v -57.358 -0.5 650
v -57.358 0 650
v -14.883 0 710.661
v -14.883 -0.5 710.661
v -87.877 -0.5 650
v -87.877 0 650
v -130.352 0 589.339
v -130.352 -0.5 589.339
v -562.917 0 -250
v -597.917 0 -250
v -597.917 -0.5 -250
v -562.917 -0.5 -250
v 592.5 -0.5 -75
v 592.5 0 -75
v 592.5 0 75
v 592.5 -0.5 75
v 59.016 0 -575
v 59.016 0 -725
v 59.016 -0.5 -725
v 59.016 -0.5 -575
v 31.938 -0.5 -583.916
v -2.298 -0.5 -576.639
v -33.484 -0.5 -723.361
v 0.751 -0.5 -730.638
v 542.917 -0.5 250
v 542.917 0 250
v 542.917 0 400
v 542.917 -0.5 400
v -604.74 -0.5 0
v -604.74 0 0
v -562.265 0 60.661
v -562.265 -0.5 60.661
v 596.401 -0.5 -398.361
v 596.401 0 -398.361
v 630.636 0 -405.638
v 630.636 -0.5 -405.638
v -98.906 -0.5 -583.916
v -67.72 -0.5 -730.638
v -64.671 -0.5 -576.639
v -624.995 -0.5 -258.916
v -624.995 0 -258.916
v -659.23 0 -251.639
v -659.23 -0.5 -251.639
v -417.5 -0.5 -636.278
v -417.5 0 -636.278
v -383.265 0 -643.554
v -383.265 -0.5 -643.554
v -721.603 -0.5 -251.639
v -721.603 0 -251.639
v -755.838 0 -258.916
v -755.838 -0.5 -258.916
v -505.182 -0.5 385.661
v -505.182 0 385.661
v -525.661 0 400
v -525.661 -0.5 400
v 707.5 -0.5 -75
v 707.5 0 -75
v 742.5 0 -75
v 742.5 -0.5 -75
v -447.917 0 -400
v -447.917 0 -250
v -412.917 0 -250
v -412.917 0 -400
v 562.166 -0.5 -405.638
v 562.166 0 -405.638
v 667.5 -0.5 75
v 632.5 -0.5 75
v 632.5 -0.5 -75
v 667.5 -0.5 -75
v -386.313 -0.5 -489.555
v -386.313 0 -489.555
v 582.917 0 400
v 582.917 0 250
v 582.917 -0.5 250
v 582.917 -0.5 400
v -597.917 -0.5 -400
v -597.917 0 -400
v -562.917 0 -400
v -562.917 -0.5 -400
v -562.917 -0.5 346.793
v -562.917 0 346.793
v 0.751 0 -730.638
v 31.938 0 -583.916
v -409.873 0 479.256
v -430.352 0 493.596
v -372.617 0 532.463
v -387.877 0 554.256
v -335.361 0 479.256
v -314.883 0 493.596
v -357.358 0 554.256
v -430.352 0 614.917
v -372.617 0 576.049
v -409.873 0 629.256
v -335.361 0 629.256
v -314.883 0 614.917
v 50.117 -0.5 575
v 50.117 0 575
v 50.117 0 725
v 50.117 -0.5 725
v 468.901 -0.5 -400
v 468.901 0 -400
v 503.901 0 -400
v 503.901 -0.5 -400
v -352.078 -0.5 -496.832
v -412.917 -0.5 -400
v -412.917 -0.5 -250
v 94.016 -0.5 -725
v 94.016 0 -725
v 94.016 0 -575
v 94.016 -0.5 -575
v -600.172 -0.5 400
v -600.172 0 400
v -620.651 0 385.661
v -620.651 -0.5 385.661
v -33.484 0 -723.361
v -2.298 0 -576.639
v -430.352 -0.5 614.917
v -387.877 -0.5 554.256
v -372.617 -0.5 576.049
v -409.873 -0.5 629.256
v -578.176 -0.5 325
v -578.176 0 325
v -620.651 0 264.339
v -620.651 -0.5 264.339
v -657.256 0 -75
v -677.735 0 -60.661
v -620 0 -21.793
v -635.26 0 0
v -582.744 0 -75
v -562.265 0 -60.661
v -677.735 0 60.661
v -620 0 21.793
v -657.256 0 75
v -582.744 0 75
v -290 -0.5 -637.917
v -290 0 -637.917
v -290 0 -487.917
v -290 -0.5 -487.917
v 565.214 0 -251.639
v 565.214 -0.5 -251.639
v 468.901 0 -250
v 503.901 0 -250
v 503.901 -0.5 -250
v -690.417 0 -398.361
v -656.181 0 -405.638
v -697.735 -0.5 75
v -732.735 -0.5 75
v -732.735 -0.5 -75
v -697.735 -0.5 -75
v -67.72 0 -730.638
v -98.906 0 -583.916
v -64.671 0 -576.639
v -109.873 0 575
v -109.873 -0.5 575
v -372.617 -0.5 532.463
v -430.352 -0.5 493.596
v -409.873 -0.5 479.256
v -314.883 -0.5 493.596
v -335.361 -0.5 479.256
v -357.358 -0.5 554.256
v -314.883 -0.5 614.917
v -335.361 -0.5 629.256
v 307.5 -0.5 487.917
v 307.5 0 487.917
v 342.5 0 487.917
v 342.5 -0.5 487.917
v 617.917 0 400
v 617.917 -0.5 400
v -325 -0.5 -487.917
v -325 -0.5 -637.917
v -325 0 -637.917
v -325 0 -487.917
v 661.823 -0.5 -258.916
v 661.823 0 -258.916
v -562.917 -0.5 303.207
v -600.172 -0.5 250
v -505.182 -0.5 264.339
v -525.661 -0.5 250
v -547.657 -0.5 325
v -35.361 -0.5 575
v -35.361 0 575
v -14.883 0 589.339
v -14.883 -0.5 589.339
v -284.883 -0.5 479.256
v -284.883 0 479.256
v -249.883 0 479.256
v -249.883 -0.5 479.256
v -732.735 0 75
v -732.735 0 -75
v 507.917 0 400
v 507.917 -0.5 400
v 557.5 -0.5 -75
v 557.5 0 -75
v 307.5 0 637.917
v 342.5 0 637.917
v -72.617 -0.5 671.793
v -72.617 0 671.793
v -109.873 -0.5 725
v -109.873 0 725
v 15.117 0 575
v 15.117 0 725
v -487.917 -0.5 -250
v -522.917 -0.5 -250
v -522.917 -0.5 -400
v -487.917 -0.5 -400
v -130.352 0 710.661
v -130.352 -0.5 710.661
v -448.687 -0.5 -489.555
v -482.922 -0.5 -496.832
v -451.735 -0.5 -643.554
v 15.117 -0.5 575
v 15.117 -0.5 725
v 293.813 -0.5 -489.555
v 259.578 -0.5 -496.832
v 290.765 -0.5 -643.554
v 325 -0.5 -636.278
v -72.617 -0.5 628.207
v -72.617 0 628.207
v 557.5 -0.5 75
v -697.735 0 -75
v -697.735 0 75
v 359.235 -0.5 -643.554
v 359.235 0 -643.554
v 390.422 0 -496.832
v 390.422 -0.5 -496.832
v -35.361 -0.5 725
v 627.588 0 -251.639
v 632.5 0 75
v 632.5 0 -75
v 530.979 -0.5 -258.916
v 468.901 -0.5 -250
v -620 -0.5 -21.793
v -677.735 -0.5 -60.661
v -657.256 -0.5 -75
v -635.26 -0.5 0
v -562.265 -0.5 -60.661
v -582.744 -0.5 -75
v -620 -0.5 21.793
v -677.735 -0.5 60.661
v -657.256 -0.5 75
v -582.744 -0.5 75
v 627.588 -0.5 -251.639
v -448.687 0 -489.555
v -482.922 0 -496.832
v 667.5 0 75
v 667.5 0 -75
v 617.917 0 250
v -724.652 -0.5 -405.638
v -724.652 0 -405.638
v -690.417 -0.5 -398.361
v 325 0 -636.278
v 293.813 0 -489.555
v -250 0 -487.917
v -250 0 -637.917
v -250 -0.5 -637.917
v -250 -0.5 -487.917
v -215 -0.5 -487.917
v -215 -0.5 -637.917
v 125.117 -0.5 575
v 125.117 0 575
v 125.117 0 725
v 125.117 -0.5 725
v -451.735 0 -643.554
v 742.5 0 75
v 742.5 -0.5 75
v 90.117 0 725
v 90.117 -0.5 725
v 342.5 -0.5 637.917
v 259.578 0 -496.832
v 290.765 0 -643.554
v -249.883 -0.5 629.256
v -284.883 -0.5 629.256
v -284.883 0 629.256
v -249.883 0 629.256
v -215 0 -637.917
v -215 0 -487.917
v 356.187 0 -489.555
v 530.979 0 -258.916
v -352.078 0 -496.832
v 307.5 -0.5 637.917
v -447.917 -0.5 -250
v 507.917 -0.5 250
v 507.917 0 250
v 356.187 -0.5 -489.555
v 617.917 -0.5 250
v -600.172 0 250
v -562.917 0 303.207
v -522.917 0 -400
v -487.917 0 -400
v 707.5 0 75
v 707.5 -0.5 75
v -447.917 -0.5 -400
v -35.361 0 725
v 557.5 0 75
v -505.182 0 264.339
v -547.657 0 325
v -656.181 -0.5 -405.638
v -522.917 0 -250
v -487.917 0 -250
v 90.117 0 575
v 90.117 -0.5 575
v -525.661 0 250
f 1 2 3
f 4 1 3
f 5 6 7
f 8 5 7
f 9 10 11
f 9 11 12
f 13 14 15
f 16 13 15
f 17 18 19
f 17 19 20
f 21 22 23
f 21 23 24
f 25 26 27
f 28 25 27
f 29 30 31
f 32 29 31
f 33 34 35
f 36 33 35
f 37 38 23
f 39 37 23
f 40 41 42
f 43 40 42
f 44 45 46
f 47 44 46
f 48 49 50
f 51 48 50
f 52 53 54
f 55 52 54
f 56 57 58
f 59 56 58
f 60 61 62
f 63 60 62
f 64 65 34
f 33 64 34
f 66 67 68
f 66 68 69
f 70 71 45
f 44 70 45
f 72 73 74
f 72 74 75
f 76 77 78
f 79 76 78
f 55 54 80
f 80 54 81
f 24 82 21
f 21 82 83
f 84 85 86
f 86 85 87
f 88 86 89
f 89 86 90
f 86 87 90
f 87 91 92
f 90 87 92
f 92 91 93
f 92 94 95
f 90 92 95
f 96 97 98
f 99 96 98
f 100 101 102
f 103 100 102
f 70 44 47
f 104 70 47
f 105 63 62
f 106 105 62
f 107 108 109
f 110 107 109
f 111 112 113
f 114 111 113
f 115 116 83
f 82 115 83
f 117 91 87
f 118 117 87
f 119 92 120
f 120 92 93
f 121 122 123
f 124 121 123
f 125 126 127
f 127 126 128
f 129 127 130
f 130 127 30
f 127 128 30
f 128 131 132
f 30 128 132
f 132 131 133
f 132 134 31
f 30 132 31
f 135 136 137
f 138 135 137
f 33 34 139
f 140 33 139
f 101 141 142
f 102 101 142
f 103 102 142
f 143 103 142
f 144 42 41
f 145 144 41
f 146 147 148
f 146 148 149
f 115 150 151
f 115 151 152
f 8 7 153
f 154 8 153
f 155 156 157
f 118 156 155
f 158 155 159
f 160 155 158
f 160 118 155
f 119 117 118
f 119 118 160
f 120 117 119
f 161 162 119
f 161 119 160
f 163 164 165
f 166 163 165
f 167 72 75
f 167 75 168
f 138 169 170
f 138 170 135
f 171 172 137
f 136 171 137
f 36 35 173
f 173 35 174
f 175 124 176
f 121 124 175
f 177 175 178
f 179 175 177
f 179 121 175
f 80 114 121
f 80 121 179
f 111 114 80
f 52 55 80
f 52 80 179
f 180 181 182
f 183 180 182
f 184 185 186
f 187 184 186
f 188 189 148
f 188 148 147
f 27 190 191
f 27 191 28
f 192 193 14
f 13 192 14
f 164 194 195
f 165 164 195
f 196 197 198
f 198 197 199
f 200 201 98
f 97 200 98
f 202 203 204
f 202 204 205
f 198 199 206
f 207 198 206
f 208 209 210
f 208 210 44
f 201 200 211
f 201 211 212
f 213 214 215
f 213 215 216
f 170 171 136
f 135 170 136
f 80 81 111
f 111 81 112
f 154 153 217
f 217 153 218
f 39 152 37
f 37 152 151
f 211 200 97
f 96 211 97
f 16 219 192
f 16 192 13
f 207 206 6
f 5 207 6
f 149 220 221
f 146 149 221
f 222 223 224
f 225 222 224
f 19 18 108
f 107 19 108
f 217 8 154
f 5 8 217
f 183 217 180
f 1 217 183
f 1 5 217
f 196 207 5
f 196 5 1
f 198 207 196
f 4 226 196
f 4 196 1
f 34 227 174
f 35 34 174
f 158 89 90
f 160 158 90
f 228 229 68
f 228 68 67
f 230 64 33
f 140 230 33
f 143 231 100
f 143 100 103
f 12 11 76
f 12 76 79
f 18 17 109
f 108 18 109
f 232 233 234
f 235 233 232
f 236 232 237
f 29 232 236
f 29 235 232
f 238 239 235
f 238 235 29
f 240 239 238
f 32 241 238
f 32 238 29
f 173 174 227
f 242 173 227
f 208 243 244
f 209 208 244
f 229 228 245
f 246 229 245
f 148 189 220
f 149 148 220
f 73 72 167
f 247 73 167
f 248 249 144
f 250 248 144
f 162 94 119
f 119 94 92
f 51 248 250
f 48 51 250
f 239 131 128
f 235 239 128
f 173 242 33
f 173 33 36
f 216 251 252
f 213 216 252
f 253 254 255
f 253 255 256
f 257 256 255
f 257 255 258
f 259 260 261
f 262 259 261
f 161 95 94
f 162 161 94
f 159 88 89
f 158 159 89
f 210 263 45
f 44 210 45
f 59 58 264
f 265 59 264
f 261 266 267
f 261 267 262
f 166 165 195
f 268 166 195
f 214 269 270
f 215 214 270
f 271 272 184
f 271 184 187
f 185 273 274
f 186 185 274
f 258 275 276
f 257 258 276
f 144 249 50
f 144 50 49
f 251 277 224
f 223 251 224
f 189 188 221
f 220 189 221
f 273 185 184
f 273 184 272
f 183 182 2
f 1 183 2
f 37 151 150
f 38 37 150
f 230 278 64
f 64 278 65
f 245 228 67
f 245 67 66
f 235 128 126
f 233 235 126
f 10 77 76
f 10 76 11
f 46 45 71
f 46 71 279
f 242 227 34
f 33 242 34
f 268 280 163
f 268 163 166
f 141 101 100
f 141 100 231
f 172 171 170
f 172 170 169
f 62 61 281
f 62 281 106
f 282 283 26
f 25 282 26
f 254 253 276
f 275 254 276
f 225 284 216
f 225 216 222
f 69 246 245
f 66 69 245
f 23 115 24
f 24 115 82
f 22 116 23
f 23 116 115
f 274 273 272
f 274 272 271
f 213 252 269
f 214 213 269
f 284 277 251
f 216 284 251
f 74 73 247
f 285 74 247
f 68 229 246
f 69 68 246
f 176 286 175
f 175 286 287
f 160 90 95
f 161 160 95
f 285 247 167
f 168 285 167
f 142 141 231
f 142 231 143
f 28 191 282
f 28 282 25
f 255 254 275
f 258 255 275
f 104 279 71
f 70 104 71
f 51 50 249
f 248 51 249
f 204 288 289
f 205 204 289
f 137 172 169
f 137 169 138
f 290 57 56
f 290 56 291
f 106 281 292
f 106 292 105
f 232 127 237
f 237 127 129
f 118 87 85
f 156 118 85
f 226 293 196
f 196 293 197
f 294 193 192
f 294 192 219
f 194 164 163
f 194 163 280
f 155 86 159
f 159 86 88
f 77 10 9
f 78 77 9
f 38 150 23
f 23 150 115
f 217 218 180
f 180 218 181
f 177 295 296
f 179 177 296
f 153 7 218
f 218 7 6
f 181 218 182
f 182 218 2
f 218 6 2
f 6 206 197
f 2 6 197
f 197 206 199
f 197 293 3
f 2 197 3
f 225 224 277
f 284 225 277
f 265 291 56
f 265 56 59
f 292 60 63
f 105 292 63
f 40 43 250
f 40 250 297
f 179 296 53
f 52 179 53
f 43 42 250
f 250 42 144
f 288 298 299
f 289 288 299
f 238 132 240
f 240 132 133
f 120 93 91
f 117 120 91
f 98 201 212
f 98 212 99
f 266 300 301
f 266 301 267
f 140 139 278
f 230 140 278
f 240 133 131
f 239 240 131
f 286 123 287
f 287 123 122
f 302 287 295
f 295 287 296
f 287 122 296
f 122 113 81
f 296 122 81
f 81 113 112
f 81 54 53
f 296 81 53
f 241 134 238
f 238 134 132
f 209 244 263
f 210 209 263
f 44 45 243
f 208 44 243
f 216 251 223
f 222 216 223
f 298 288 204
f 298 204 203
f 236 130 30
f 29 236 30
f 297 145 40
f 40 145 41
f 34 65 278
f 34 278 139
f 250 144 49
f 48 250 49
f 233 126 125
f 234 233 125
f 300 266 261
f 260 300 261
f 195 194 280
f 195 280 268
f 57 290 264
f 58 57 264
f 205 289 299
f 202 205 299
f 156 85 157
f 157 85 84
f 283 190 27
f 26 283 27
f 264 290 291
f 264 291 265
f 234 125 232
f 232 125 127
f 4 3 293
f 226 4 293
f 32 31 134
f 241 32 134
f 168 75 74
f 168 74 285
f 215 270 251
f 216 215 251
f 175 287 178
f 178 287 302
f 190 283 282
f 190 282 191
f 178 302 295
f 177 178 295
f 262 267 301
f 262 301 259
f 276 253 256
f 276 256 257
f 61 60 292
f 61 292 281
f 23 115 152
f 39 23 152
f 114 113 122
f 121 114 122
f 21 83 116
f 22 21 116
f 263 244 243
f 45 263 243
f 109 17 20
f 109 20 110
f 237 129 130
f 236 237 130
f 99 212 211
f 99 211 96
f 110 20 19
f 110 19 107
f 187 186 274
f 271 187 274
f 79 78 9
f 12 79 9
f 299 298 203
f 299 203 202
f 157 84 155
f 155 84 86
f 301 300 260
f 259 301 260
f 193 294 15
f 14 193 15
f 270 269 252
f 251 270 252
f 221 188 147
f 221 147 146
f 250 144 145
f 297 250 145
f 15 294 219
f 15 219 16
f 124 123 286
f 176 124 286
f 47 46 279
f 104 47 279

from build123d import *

# Parameters (mm, degrees)
F1_W      = 35
F1_H      = 150
F13_DEPTH = 0.5
F2_W      = 35
F2_H      = 150
F3_W      = 35
F3_H      = 150
F4_W      = 35
F4_H      = 150
F6_W      = 35
F6_H      = 150
F7_W      = 35
F7_H      = 150
F8_W      = 35
F8_H      = 150
F9_W      = 35
F9_H      = 150
F11_W     = 35
F11_H     = 150
F12_W     = 35
F12_H     = 150


with BuildPart() as f13:
    # F1 (on Front) → F13 (new body)
    with BuildSketch(Plane.XZ):
        with Locations((325, 562.9165124599)):
            Rectangle(F1_W, F1_H)
    extrude(amount=F13_DEPTH)


with BuildPart() as f13b:
    # F2 (on Front) → F13, piece 2 (new body)
    with BuildSketch(Plane.XZ):
        with Locations((525.4165124599, 325)):
            Rectangle(F2_W, F2_H)
    extrude(amount=F13_DEPTH)


with BuildPart() as f13c:
    # F2 (on Front) → F13, piece 3 (new body)
    with BuildSketch(Plane.XZ):
        with Locations((600.4165124599, 325)):
            Rectangle(F2_W, F2_H)
    extrude(amount=F13_DEPTH)


with BuildPart() as f13d:
    # F3 (on Front) → F13, piece 4 (new body)
    with BuildSketch(Plane.XZ):
        with Locations((575, 0)):
            Rectangle(F3_W, F3_H)
    extrude(amount=F13_DEPTH)


with BuildPart() as f13e:
    # F3 (on Front) → F13, piece 5 (new body)
    with BuildSketch(Plane.XZ):
        with Locations((650, 0)):
            Rectangle(F3_W, F3_H)
    extrude(amount=F13_DEPTH)


with BuildPart() as f13f:
    # F3 (on Front) → F13, piece 6 (new body)
    with BuildSketch(Plane.XZ):
        with Locations((725, 0)):
            Rectangle(F3_W, F3_H)
    extrude(amount=F13_DEPTH)


with BuildPart() as f13g:
    # F4 (on Front) → F13, piece 7 (new body)
    with BuildSketch(Plane.XZ):
        with Locations((486.4008496814, -325)):
            Rectangle(F4_W, F4_H)
    extrude(amount=F13_DEPTH)


with BuildPart() as f13h:
    # F4 (on Front) → F13, piece 8 (new body)
    with BuildSketch(Plane.XZ):
        Polygon((627.587603304, -251.638929945), (596.4008496814, -398.361070055), (630.636015707, -405.6379792337), (661.8227693297, -258.9158391236), align=None)
    extrude(amount=F13_DEPTH)


with BuildPart() as f13i:
    # F4 (on Front) → F13, piece 9 (new body)
    with BuildSketch(Plane.XZ):
        Polygon((565.2140960587, -251.638929945), (530.978930033, -258.9158391236), (562.1656836557, -405.6379792337), (596.4008496814, -398.361070055), align=None)
    extrude(amount=F13_DEPTH)


with BuildPart() as f13j:
    # F5 (on Front) → F13, piece 10 (new body)
    with BuildSketch(Plane.XZ):
        Polygon((356.1867536227, -489.5554424048), (325, -636.2775825149), (359.2351660257, -643.5544916935), (390.4219196483, -496.8323515835), align=None)
    extrude(amount=F13_DEPTH)


with BuildPart() as f13k:
    # F5 (on Front) → F13, piece 11 (new body)
    with BuildSketch(Plane.XZ):
        Polygon((293.8132463773, -489.5554424049), (259.5780803517, -496.8323515835), (290.7648339743, -643.5544916935), (325, -636.2775825149), align=None)
    extrude(amount=F13_DEPTH)


with BuildPart() as f13l:
    # F6 (on Front) → F13, piece 12 (new body)
    with BuildSketch(Plane.XZ):
        with Locations((76.5156627785, -650)):
            Rectangle(F6_W, F6_H)
    extrude(amount=F13_DEPTH)


with BuildPart() as f13m:
    # F6 (on Front) → F13, piece 13 (new body)
    with BuildSketch(Plane.XZ):
        Polygon((-2.2975835988, -576.638929945), (-33.4843372215, -723.361070055), (0.7508288042, -730.6379792337), (31.9375824269, -583.9158391236), align=None)
    extrude(amount=F13_DEPTH)


with BuildPart() as f13n:
    # F6 (on Front) → F13, piece 14 (new body)
    with BuildSketch(Plane.XZ):
        Polygon((-64.6710908441, -576.638929945), (-98.9062568698, -583.9158391236), (-67.7195032472, -730.6379792337), (-33.4843372215, -723.361070055), align=None)
    extrude(amount=F13_DEPTH)


with BuildPart() as f13o:
    # F7 (on Front) → F13, piece 15 (new body)
    with BuildSketch(Plane.XZ):
        with Locations((-307.5, -562.9165124599)):
            Rectangle(F7_W, F7_H)
    extrude(amount=F13_DEPTH)


with BuildPart() as f13p:
    # F7 (on Front) → F13, piece 16 (new body)
    with BuildSketch(Plane.XZ):
        Polygon((-386.3132463773, -489.5554424049), (-417.5, -636.2775825149), (-383.2648339743, -643.5544916935), (-352.0780803517, -496.8323515835), align=None)
    extrude(amount=F13_DEPTH)


with BuildPart() as f13q:
    # F7 (on Front) → F13, piece 17 (new body)
    with BuildSketch(Plane.XZ):
        Polygon((-448.6867536227, -489.5554424049), (-482.9219196483, -496.8323515835), (-451.7351660257, -643.5544916935), (-417.5, -636.2775825149), align=None)
    extrude(amount=F13_DEPTH)


with BuildPart() as f13r:
    # F7 (on Front) → F13, piece 18 (new body)
    with BuildSketch(Plane.XZ):
        with Locations((-232.5, -562.9165124599)):
            Rectangle(F7_W, F7_H)
    extrude(amount=F13_DEPTH)


with BuildPart() as f13s:
    # F8 (on Front) → F13, piece 19 (new body)
    with BuildSketch(Plane.XZ):
        with Locations((-580.4165124599, -325)):
            Rectangle(F8_W, F8_H)
    extrude(amount=F13_DEPTH)


with BuildPart() as f13t:
    # F8 (on Front) → F13, piece 20 (new body)
    with BuildSketch(Plane.XZ):
        Polygon((-659.2297588372, -251.638929945), (-690.4165124599, -398.361070055), (-656.1813464342, -405.6379792337), (-624.9945928115, -258.9158391236), align=None)
    extrude(amount=F13_DEPTH)


with BuildPart() as f13u:
    # F8 (on Front) → F13, piece 21 (new body)
    with BuildSketch(Plane.XZ):
        Polygon((-721.6032660825, -251.638929945), (-755.8384321082, -258.9158391236), (-724.6516784856, -405.6379792337), (-690.4165124599, -398.361070055), align=None)
    extrude(amount=F13_DEPTH)


with BuildPart() as f13v:
    # F8 (on Front) → F13, piece 22 (new body)
    with BuildSketch(Plane.XZ):
        with Locations((-505.4165124599, -325)):
            Rectangle(F8_W, F8_H)
    extrude(amount=F13_DEPTH)


with BuildPart() as f13w:
    # F8 (on Front) → F13, piece 23 (new body)
    with BuildSketch(Plane.XZ):
        with Locations((-430.4165124599, -325)):
            Rectangle(F8_W, F8_H)
    extrude(amount=F13_DEPTH)


with BuildPart() as f13x:
    # F9 (on Front) → F13, piece 24 (new body)
    with BuildSketch(Plane.XZ):
        Polygon((-657.2558830062, 75), (-677.7346841134, 60.6605890912), (-635.2596823595, 0), (-631.8485692054, 4.8715744519), (-611.3697680981, -9.4678364569), (-620, -21.7930849453), (-582.7441169938, -75), (-562.2653158866, -60.6605890912), (-604.7403176405, 0), (-608.1514307946, -4.8715744519), (-628.6302319019, 9.4678364569), (-620, 21.7930849453), align=None)
        Polygon((-631.8485692054, 4.8715744519), (-635.2596823595, 0), (-620, -21.7930849453), (-611.3697680981, -9.4678364569), align=None)
        Polygon((-620, -21.7930849453), (-635.2596823595, 0), (-677.7346841134, -60.6605890912), (-657.2558830062, -75), align=None)
        Polygon((-582.7441169938, 75), (-620, 21.7930849453), (-604.7403176405, 0), (-562.2653158866, 60.6605890912), align=None)
        Polygon((-604.7403176405, 0), (-620, 21.7930849453), (-628.6302319019, 9.4678364569), (-608.1514307946, -4.8715744519), align=None)
    extrude(amount=F13_DEPTH)


with BuildPart() as f13y:
    # F9 (on Front) → F13, piece 25 (new body)
    with BuildSketch(Plane.XZ):
        with Locations((-715.2346841134, 0)):
            Rectangle(F9_W, F9_H)
    extrude(amount=F13_DEPTH)


with BuildPart() as f13z:
    # F10 (on Front) → F13, piece 26 (new body)
    with BuildSketch(Plane.XZ):
        Polygon((-600.1723954661, 400), (-620.6511965733, 385.6605890912), (-578.1761948194, 325), (-574.7650816652, 329.8715744519), (-554.286280558, 315.5321635431), (-562.9165124599, 303.2069150547), (-525.6606294537, 250), (-505.1818283465, 264.3394109088), (-547.6568301004, 325), (-551.0679432545, 320.1284255481), (-571.5467443618, 334.4678364569), (-562.9165124599, 346.7930849453), align=None)
        Polygon((-574.7650816652, 329.8715744519), (-578.1761948194, 325), (-562.9165124599, 303.2069150547), (-554.286280558, 315.5321635431), align=None)
        Polygon((-562.9165124599, 303.2069150547), (-578.1761948194, 325), (-620.6511965733, 264.3394109088), (-600.1723954661, 250), align=None)
        Polygon((-525.6606294537, 400), (-562.9165124599, 346.7930849453), (-547.6568301004, 325), (-505.1818283465, 385.6605890912), align=None)
        Polygon((-547.6568301004, 325), (-562.9165124599, 346.7930849453), (-571.5467443618, 334.4678364569), (-551.0679432545, 320.1284255481), align=None)
    extrude(amount=F13_DEPTH)


with BuildPart() as f13ba:
    # F11 (on Front) → F13, piece 27 (new body)
    with BuildSketch(Plane.XZ):
        Polygon((-409.8732250629, 629.256258422), (-430.3520261702, 614.9168475133), (-387.8770244162, 554.256258422), (-384.4659112621, 559.1278328739), (-363.9871101548, 544.7884219652), (-372.6173420567, 532.4631734768), (-335.3614590505, 479.256258422), (-314.8826579433, 493.5956693308), (-357.3576596972, 554.256258422), (-360.7687728514, 549.3846839701), (-381.2475739586, 563.7240948789), (-372.6173420567, 576.0493433673), align=None)
        Polygon((-384.4659112621, 559.1278328739), (-387.8770244162, 554.256258422), (-372.6173420567, 532.4631734768), (-363.9871101548, 544.7884219652), align=None)
        Polygon((-372.6173420567, 532.4631734768), (-387.8770244162, 554.256258422), (-430.3520261702, 493.5956693308), (-409.8732250629, 479.256258422), align=None)
        Polygon((-335.3614590505, 629.256258422), (-372.6173420567, 576.0493433673), (-357.3576596972, 554.256258422), (-314.8826579433, 614.9168475133), align=None)
        Polygon((-357.3576596972, 554.256258422), (-372.6173420567, 576.0493433673), (-381.2475739586, 563.7240948789), (-360.7687728514, 549.3846839701), align=None)
    extrude(amount=F13_DEPTH)


with BuildPart() as f13bb:
    # F11 (on Front) → F13, piece 28 (new body)
    with BuildSketch(Plane.XZ):
        with Locations((-267.3826579433, 554.256258422)):
            Rectangle(F11_W, F11_H)
    extrude(amount=F13_DEPTH)


with BuildPart() as f13bc:
    # F12 (on Front) → F13, piece 29 (new body)
    with BuildSketch(Plane.XZ):
        Polygon((-109.8732250629, 725), (-130.3520261702, 710.6605890912), (-87.8770244162, 650), (-84.4659112621, 654.8715744519), (-63.9871101548, 640.5321635431), (-72.6173420567, 628.2069150547), (-35.3614590505, 575), (-14.8826579433, 589.3394109088), (-57.3576596972, 650), (-60.7687728514, 645.1284255481), (-81.2475739586, 659.4678364569), (-72.6173420567, 671.7930849453), align=None)
        Polygon((-84.4659112621, 654.8715744519), (-87.8770244162, 650), (-72.6173420567, 628.2069150547), (-63.9871101548, 640.5321635431), align=None)
        Polygon((-72.6173420567, 628.2069150547), (-87.8770244162, 650), (-130.3520261702, 589.3394109088), (-109.8732250629, 575), align=None)
        Polygon((-35.3614590505, 725), (-72.6173420567, 671.7930849453), (-57.3576596972, 650), (-14.8826579433, 710.6605890912), align=None)
        Polygon((-57.3576596972, 650), (-72.6173420567, 671.7930849453), (-81.2475739586, 659.4678364569), (-60.7687728514, 645.1284255481), align=None)
    extrude(amount=F13_DEPTH)


with BuildPart() as f13bd:
    # F12 (on Front) → F13, piece 30 (new body)
    with BuildSketch(Plane.XZ):
        with Locations((32.6173420567, 650)):
            Rectangle(F12_W, F12_H)
    extrude(amount=F13_DEPTH)


with BuildPart() as f13be:
    # F12 (on Front) → F13, piece 31 (new body)
    with BuildSketch(Plane.XZ):
        with Locations((107.6173420567, 650)):
            Rectangle(F12_W, F12_H)
    extrude(amount=F13_DEPTH)


solid = Compound([f13.part, f13b.part, f13c.part, f13d.part, f13e.part, f13f.part, f13g.part, f13h.part, f13i.part, f13j.part, f13k.part, f13l.part, f13m.part, f13n.part, f13o.part, f13p.part, f13q.part, f13r.part, f13s.part, f13t.part, f13u.part, f13v.part, f13w.part, f13x.part, f13y.part, f13z.part, f13ba.part, f13bb.part, f13bc.part, f13bd.part, f13be.part])
